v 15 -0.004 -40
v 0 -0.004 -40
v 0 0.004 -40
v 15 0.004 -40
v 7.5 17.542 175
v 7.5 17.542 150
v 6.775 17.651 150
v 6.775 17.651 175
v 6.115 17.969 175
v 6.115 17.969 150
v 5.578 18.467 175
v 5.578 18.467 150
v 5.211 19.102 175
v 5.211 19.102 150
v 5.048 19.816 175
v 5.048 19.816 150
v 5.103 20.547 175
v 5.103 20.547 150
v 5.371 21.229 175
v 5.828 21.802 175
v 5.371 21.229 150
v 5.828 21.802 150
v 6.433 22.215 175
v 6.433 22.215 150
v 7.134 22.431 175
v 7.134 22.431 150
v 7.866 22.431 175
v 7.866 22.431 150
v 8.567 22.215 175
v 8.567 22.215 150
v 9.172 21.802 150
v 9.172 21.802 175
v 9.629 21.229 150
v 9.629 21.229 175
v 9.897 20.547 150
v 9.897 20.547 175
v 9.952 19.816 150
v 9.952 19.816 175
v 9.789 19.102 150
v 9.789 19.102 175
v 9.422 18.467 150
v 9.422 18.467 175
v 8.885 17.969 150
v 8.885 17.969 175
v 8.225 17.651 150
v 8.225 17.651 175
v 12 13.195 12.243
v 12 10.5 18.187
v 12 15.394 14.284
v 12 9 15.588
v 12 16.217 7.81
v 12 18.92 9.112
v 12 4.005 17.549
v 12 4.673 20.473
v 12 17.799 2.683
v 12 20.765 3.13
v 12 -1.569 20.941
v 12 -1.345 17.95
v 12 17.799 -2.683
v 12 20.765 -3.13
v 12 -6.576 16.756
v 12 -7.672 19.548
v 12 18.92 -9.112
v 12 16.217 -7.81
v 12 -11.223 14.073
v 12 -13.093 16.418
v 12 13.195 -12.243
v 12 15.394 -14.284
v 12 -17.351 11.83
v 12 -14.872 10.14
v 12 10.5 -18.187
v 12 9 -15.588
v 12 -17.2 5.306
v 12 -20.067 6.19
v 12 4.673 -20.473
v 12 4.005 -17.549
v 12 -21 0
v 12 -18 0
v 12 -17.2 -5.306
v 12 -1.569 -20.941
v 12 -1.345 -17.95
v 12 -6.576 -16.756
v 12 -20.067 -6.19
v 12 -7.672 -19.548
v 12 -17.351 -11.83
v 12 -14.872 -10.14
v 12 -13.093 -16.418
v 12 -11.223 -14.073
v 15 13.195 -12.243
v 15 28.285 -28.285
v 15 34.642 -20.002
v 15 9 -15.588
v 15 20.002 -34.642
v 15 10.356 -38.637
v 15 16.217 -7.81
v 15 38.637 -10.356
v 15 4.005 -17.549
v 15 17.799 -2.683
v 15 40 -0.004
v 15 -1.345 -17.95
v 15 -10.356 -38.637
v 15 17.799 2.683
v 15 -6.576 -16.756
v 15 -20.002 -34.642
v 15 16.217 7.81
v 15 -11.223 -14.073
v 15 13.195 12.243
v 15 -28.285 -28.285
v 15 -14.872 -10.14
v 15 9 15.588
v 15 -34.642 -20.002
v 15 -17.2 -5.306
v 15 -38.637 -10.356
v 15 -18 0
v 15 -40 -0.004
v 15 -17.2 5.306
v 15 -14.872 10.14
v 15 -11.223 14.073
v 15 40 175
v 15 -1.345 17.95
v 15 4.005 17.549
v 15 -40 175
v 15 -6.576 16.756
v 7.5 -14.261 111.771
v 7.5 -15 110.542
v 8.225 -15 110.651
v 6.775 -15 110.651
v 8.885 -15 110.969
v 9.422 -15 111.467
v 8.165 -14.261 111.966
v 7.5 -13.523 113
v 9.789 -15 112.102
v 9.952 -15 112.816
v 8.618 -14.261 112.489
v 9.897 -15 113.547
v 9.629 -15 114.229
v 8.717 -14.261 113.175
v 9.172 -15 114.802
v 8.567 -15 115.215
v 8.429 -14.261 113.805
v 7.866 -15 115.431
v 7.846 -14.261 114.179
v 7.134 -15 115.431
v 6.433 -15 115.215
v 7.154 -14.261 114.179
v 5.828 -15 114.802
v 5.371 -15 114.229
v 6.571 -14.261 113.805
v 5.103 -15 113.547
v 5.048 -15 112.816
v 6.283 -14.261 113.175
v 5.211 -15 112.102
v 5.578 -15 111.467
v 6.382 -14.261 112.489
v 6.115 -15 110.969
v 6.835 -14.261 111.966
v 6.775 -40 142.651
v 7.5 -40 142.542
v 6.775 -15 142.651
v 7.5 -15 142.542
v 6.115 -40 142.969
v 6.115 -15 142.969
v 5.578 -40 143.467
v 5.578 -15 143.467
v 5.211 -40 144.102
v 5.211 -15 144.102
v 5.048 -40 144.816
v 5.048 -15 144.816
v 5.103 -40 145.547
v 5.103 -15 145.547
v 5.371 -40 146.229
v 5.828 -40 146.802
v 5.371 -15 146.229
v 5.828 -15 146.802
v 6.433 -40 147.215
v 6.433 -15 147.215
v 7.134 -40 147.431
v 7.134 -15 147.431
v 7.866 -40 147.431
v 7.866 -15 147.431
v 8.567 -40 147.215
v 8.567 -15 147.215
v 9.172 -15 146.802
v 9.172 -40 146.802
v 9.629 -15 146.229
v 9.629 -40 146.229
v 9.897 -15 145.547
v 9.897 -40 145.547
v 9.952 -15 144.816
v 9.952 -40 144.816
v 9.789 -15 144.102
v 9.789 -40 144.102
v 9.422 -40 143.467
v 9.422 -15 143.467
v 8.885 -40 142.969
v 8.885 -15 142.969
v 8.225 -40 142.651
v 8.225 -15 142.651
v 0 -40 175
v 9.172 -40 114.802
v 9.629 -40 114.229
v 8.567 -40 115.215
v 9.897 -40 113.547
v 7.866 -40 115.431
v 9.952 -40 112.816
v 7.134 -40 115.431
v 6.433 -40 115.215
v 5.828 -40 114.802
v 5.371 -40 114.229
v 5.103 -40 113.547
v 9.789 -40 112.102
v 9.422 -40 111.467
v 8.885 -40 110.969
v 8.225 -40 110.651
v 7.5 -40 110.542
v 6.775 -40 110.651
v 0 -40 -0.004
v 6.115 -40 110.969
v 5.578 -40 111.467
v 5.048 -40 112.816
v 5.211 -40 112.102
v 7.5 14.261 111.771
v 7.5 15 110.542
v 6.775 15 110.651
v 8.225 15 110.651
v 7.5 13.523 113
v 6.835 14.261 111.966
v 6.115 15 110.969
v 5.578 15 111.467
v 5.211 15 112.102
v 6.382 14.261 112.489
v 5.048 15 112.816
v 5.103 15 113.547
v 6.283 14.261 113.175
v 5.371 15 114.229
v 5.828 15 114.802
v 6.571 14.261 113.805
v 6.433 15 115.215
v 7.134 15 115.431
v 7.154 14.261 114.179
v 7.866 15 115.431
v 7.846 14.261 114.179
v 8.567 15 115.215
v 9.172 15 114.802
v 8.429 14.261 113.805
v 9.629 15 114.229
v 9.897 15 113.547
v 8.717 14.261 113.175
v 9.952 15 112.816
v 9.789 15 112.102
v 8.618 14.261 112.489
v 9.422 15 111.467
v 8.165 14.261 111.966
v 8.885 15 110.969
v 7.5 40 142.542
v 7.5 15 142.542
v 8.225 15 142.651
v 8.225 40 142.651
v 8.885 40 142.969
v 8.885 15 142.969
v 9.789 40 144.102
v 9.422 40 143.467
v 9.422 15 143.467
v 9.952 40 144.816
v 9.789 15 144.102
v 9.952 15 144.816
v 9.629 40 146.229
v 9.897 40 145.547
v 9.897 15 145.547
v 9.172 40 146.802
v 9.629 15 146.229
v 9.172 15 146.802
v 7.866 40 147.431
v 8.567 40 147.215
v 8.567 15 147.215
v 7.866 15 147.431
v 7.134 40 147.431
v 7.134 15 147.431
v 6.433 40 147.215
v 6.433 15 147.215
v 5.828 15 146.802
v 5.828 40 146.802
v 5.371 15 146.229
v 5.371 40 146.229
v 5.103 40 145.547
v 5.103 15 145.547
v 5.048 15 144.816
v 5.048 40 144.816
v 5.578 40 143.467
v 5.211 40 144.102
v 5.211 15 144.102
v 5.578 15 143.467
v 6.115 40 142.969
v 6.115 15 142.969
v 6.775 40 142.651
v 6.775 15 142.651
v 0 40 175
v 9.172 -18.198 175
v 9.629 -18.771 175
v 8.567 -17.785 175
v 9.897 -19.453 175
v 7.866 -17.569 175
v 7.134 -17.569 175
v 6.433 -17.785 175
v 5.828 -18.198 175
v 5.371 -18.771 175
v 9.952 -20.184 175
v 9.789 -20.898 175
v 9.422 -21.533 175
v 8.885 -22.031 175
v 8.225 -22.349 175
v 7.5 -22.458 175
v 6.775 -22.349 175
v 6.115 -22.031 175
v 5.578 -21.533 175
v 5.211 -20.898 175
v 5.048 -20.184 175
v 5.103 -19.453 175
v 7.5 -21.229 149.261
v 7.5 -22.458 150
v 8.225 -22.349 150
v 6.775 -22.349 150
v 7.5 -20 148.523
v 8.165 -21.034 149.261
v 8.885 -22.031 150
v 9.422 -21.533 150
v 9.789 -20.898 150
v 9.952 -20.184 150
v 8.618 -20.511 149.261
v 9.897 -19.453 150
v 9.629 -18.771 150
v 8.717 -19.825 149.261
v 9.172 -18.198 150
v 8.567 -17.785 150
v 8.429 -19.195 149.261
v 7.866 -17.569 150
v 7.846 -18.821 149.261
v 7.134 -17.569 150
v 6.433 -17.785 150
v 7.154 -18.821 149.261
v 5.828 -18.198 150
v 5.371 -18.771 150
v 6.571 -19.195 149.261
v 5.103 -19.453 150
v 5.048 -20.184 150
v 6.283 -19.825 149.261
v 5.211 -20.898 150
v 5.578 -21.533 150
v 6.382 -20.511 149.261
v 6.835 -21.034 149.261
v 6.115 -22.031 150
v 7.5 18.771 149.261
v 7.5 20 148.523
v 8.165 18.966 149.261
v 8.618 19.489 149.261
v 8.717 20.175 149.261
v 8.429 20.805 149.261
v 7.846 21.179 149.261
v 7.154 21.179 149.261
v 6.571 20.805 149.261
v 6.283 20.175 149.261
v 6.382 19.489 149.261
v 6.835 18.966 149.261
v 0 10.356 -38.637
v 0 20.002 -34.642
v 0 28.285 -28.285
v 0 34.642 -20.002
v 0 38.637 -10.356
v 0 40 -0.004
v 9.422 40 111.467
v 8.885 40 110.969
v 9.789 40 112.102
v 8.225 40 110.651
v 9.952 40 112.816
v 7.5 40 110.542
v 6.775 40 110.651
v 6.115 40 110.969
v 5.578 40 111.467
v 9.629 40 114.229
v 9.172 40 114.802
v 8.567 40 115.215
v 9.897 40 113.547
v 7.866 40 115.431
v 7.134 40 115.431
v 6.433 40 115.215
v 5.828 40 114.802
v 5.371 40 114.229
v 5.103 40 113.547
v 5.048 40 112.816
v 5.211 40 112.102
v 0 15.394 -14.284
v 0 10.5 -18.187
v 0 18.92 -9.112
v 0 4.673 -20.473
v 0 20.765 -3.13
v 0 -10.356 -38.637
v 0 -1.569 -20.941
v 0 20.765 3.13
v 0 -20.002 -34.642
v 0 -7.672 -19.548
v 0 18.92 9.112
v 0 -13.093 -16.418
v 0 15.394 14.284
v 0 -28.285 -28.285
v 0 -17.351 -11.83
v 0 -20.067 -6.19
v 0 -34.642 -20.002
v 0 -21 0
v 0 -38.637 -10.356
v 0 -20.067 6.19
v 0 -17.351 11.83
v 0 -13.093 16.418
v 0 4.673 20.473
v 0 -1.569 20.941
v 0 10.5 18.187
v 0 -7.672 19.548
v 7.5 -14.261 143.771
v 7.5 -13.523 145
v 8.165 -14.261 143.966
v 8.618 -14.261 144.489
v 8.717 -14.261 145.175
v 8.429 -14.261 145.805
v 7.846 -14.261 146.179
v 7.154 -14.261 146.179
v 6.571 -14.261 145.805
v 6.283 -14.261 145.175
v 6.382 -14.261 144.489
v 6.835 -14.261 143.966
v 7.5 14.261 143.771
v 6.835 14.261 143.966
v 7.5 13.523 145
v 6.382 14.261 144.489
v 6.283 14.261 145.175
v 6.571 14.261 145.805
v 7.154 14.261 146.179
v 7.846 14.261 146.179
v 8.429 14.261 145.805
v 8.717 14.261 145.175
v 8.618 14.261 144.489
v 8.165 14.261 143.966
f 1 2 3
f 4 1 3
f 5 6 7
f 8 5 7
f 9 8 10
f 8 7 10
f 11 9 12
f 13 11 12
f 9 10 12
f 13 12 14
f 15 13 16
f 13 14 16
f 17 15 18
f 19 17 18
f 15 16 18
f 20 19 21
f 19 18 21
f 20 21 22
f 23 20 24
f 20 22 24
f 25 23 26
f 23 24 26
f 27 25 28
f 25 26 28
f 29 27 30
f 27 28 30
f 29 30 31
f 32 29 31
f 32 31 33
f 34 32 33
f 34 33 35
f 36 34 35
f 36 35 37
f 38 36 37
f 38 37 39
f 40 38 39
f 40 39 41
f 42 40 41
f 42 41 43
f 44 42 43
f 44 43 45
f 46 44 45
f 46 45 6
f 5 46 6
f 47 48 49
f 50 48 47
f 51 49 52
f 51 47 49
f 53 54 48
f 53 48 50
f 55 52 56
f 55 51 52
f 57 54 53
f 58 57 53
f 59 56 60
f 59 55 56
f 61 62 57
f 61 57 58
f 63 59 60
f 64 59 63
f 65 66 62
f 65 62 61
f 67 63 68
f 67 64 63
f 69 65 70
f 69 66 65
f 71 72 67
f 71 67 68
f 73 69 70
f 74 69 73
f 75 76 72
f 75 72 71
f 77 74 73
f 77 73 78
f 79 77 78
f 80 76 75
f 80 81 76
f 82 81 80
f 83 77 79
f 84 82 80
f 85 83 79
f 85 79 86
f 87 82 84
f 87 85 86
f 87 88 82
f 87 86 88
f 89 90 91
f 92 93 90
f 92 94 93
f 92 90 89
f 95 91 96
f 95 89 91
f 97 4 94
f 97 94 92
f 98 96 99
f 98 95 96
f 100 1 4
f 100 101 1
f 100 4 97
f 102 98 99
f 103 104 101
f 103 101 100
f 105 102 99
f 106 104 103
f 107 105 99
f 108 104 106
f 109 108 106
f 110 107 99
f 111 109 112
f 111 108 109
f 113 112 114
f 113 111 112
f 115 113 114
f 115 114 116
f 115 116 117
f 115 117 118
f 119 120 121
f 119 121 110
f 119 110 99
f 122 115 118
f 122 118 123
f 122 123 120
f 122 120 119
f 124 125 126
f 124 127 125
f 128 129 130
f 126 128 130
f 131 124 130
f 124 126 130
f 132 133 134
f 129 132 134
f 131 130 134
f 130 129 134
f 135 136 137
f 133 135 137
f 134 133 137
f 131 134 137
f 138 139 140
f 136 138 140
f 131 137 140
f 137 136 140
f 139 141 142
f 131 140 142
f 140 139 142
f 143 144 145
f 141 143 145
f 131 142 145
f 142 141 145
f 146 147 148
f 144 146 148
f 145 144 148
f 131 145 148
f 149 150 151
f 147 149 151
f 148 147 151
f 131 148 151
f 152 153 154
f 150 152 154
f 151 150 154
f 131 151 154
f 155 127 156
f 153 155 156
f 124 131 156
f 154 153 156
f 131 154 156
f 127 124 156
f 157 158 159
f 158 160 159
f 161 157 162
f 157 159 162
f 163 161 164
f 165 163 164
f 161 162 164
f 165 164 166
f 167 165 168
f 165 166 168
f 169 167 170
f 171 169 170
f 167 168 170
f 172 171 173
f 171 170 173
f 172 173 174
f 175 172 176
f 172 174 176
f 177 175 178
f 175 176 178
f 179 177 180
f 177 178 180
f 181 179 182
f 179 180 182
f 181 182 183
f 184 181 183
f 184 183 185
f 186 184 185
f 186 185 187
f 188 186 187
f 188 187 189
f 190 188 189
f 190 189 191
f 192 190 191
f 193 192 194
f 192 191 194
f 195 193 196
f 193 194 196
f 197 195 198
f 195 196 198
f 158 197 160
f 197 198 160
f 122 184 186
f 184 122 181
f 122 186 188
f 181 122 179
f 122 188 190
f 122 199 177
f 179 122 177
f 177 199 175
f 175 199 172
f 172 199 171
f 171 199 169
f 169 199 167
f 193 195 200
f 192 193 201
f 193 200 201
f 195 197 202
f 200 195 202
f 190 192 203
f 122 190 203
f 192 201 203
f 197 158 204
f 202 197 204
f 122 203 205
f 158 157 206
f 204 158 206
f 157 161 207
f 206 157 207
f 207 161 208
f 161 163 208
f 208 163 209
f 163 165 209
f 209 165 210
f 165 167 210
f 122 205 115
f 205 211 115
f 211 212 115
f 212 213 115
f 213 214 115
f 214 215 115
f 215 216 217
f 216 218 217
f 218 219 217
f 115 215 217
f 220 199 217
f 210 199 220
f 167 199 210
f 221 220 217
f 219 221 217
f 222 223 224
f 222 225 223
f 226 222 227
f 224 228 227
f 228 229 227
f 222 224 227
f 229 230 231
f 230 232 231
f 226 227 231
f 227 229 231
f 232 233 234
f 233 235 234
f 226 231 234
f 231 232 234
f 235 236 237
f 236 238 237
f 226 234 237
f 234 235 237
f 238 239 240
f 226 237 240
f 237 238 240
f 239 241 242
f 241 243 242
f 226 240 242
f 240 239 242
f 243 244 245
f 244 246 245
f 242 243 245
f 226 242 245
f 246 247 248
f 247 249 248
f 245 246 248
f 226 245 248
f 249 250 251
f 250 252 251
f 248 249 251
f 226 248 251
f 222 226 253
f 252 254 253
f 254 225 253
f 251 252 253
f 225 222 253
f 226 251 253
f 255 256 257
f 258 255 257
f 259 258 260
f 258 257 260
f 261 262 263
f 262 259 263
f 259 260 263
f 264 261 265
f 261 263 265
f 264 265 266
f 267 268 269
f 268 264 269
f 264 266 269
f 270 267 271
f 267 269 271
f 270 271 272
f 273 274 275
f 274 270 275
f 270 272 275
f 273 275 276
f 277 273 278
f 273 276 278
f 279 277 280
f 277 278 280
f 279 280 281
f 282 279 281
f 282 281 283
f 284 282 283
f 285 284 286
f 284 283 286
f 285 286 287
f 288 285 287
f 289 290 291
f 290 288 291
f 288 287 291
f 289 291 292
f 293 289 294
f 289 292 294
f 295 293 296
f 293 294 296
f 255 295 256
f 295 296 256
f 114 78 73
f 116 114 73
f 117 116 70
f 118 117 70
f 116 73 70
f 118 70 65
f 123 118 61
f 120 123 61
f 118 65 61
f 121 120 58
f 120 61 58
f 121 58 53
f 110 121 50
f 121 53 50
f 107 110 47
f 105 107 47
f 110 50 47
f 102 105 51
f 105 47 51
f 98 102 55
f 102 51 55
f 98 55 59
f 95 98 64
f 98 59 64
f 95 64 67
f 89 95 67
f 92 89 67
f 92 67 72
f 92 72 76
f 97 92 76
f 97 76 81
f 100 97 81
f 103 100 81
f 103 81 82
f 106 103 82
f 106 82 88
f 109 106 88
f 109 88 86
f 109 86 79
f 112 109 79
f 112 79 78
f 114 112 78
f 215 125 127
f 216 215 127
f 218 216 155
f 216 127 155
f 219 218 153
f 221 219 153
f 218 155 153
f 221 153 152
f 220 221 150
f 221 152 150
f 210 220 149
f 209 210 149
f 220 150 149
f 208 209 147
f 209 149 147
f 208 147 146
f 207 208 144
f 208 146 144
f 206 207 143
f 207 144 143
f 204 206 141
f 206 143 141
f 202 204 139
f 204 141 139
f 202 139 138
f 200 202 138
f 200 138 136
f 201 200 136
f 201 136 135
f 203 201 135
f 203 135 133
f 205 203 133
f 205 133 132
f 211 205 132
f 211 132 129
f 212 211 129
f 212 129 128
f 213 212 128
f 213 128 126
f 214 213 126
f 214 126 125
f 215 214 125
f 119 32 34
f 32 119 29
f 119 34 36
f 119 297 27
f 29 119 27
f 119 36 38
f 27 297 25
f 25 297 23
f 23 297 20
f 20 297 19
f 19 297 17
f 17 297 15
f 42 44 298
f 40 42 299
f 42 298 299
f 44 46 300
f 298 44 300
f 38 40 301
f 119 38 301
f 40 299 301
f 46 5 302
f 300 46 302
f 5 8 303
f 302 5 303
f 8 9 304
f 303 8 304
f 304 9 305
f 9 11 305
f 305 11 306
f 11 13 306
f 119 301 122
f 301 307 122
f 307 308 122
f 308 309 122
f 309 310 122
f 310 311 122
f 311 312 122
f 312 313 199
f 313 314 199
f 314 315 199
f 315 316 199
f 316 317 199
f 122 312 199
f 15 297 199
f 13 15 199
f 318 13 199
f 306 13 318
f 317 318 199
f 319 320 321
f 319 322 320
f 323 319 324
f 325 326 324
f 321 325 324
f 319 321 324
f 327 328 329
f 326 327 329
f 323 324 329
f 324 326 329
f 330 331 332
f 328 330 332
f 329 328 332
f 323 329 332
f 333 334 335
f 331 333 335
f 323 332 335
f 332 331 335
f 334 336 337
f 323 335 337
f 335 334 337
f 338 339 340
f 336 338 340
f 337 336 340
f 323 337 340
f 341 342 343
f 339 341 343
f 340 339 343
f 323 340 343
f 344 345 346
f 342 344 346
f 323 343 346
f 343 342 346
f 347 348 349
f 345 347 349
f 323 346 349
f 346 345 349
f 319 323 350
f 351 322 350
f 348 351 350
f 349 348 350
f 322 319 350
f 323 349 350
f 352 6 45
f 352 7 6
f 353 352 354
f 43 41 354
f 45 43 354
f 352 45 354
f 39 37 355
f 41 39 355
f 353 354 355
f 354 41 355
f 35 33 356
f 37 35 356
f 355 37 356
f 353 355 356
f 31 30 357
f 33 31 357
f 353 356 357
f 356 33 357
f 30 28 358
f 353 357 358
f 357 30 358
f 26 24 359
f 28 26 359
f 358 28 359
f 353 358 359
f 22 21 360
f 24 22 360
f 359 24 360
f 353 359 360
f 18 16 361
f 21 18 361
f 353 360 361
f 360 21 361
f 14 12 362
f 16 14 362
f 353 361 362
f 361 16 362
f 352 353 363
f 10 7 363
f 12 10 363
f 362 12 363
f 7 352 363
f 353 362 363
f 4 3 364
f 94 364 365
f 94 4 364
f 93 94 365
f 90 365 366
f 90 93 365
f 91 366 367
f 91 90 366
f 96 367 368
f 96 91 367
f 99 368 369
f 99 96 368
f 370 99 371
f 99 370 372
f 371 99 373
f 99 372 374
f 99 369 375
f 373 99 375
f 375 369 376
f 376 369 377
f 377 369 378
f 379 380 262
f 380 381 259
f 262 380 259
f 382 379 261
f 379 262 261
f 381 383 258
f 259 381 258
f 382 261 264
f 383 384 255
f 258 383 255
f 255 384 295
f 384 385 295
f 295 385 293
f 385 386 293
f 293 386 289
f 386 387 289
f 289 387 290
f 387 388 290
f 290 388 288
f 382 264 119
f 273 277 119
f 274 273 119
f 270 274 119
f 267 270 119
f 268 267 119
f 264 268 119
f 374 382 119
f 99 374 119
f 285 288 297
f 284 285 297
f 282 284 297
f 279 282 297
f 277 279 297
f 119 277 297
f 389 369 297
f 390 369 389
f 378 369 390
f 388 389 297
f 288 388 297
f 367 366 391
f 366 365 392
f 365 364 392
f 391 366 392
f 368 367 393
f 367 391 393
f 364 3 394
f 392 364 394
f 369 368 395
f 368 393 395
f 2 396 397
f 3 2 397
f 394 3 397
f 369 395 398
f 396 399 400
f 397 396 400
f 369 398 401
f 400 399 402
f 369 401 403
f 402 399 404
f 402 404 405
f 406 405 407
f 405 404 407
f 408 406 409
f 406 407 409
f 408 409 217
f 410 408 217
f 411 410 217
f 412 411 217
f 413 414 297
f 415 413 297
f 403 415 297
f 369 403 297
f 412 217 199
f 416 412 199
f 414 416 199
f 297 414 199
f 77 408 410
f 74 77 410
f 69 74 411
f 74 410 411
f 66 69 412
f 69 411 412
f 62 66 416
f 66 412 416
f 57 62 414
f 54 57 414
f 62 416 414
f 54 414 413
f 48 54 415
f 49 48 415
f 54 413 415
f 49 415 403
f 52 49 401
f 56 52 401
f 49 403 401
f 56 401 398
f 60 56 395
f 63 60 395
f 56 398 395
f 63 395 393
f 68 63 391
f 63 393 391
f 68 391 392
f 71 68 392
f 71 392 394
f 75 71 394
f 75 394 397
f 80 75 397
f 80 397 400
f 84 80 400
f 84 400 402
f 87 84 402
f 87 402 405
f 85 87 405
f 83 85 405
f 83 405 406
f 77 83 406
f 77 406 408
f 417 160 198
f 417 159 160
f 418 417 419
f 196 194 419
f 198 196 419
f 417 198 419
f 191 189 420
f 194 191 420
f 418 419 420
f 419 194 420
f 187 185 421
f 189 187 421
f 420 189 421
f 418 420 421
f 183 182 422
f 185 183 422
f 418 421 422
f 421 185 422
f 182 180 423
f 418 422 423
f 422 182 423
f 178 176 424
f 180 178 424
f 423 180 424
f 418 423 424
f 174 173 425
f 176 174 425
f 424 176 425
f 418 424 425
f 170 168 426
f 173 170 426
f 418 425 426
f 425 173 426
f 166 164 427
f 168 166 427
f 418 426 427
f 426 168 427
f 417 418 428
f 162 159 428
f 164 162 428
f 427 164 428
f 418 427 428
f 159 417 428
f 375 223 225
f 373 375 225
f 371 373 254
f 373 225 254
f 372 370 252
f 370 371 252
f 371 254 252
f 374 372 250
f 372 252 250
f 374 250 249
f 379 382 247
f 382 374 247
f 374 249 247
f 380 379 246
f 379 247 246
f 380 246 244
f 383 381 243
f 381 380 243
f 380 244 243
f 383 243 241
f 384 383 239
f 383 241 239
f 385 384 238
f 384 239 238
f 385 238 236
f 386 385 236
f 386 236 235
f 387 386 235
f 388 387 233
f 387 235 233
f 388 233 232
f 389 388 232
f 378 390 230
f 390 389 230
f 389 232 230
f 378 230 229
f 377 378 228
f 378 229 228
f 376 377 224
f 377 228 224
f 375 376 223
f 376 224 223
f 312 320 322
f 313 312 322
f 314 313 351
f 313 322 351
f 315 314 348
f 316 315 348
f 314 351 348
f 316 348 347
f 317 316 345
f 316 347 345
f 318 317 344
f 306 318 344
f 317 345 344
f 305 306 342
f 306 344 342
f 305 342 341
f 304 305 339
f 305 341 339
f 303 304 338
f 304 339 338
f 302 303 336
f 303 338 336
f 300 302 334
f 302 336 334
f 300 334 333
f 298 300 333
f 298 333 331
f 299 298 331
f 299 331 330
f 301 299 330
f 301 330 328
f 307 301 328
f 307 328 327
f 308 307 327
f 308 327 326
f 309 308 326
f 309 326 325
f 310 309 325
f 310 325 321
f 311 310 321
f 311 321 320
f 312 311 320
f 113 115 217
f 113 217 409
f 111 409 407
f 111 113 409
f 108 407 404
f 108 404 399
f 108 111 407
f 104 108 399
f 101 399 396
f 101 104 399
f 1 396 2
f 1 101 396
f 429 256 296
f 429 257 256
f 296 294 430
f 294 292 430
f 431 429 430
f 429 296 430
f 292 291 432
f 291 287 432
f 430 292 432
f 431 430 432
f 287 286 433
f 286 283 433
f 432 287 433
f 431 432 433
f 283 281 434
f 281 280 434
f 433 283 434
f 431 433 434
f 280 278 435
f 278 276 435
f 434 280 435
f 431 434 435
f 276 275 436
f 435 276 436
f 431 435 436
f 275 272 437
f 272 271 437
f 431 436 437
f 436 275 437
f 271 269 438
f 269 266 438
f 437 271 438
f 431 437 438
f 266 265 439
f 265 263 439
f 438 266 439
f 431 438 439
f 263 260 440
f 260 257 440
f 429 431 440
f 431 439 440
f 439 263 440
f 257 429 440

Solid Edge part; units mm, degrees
sketch "Sketch1" plane through (0, 0, 0) normal (1, 0, 0) x (0, 1, 0)
  line L0 (40, 175) -> (-40, 175)
  line L1 (-40, 175) -> (-40, -40)
  line L2 (-40, -40) -> (40, -40)
  line L3 (40, -40) -> (40, 175)
extrude "Protrusion1" add sketch "Sketch1" along normal blind 15
sketch "Sketch2" plane through (0, 0, 35) normal (-1, 0, 0) x (0, -1, 0)
  circle A0 centre (0, -35) radius 18
extrude "Extrusionsausschnitt_1" cut sketch "Sketch2" against normal blind 145
sketch "Sketch3" plane through (0, 0, 35) normal (-1, 0, 0) x (0, -1, 0)
  circle A0 centre (0, -35) radius 21
extrude "Extrusionsausschnitt_2" cut sketch "Sketch3" against normal blind 12
fillet "Verrundung_1" radius 40 2 edges at (7.5, 40, -40) (7.5, -40, -40)
hole "Bohrung_1" at (7.5, -40, 113) direction (0, 1, 0) diameter 4.917 depth 25 tip angle 118 thread major 6 thread length 20
hole "Hole1" at (7.5, -40, 145) direction (0, 1, 0) diameter 4.917 depth 25 tip angle 118 thread major 6 thread length 20
hole "Bohrung_3" at (7.5, 20, 175) direction (0, 0, -1) diameter 4.917 depth 25 tip angle 118 thread major 6 thread length 20
hole "Hole2" at (7.5, -20, 175) direction (0, 0, -1) diameter 4.917 depth 25 tip angle 118 thread major 6 thread length 20
mirror "Mirror1" about plane through (0, 0, 0) normal (0, -1, 0) of "Bohrung_1", "Hole1"
